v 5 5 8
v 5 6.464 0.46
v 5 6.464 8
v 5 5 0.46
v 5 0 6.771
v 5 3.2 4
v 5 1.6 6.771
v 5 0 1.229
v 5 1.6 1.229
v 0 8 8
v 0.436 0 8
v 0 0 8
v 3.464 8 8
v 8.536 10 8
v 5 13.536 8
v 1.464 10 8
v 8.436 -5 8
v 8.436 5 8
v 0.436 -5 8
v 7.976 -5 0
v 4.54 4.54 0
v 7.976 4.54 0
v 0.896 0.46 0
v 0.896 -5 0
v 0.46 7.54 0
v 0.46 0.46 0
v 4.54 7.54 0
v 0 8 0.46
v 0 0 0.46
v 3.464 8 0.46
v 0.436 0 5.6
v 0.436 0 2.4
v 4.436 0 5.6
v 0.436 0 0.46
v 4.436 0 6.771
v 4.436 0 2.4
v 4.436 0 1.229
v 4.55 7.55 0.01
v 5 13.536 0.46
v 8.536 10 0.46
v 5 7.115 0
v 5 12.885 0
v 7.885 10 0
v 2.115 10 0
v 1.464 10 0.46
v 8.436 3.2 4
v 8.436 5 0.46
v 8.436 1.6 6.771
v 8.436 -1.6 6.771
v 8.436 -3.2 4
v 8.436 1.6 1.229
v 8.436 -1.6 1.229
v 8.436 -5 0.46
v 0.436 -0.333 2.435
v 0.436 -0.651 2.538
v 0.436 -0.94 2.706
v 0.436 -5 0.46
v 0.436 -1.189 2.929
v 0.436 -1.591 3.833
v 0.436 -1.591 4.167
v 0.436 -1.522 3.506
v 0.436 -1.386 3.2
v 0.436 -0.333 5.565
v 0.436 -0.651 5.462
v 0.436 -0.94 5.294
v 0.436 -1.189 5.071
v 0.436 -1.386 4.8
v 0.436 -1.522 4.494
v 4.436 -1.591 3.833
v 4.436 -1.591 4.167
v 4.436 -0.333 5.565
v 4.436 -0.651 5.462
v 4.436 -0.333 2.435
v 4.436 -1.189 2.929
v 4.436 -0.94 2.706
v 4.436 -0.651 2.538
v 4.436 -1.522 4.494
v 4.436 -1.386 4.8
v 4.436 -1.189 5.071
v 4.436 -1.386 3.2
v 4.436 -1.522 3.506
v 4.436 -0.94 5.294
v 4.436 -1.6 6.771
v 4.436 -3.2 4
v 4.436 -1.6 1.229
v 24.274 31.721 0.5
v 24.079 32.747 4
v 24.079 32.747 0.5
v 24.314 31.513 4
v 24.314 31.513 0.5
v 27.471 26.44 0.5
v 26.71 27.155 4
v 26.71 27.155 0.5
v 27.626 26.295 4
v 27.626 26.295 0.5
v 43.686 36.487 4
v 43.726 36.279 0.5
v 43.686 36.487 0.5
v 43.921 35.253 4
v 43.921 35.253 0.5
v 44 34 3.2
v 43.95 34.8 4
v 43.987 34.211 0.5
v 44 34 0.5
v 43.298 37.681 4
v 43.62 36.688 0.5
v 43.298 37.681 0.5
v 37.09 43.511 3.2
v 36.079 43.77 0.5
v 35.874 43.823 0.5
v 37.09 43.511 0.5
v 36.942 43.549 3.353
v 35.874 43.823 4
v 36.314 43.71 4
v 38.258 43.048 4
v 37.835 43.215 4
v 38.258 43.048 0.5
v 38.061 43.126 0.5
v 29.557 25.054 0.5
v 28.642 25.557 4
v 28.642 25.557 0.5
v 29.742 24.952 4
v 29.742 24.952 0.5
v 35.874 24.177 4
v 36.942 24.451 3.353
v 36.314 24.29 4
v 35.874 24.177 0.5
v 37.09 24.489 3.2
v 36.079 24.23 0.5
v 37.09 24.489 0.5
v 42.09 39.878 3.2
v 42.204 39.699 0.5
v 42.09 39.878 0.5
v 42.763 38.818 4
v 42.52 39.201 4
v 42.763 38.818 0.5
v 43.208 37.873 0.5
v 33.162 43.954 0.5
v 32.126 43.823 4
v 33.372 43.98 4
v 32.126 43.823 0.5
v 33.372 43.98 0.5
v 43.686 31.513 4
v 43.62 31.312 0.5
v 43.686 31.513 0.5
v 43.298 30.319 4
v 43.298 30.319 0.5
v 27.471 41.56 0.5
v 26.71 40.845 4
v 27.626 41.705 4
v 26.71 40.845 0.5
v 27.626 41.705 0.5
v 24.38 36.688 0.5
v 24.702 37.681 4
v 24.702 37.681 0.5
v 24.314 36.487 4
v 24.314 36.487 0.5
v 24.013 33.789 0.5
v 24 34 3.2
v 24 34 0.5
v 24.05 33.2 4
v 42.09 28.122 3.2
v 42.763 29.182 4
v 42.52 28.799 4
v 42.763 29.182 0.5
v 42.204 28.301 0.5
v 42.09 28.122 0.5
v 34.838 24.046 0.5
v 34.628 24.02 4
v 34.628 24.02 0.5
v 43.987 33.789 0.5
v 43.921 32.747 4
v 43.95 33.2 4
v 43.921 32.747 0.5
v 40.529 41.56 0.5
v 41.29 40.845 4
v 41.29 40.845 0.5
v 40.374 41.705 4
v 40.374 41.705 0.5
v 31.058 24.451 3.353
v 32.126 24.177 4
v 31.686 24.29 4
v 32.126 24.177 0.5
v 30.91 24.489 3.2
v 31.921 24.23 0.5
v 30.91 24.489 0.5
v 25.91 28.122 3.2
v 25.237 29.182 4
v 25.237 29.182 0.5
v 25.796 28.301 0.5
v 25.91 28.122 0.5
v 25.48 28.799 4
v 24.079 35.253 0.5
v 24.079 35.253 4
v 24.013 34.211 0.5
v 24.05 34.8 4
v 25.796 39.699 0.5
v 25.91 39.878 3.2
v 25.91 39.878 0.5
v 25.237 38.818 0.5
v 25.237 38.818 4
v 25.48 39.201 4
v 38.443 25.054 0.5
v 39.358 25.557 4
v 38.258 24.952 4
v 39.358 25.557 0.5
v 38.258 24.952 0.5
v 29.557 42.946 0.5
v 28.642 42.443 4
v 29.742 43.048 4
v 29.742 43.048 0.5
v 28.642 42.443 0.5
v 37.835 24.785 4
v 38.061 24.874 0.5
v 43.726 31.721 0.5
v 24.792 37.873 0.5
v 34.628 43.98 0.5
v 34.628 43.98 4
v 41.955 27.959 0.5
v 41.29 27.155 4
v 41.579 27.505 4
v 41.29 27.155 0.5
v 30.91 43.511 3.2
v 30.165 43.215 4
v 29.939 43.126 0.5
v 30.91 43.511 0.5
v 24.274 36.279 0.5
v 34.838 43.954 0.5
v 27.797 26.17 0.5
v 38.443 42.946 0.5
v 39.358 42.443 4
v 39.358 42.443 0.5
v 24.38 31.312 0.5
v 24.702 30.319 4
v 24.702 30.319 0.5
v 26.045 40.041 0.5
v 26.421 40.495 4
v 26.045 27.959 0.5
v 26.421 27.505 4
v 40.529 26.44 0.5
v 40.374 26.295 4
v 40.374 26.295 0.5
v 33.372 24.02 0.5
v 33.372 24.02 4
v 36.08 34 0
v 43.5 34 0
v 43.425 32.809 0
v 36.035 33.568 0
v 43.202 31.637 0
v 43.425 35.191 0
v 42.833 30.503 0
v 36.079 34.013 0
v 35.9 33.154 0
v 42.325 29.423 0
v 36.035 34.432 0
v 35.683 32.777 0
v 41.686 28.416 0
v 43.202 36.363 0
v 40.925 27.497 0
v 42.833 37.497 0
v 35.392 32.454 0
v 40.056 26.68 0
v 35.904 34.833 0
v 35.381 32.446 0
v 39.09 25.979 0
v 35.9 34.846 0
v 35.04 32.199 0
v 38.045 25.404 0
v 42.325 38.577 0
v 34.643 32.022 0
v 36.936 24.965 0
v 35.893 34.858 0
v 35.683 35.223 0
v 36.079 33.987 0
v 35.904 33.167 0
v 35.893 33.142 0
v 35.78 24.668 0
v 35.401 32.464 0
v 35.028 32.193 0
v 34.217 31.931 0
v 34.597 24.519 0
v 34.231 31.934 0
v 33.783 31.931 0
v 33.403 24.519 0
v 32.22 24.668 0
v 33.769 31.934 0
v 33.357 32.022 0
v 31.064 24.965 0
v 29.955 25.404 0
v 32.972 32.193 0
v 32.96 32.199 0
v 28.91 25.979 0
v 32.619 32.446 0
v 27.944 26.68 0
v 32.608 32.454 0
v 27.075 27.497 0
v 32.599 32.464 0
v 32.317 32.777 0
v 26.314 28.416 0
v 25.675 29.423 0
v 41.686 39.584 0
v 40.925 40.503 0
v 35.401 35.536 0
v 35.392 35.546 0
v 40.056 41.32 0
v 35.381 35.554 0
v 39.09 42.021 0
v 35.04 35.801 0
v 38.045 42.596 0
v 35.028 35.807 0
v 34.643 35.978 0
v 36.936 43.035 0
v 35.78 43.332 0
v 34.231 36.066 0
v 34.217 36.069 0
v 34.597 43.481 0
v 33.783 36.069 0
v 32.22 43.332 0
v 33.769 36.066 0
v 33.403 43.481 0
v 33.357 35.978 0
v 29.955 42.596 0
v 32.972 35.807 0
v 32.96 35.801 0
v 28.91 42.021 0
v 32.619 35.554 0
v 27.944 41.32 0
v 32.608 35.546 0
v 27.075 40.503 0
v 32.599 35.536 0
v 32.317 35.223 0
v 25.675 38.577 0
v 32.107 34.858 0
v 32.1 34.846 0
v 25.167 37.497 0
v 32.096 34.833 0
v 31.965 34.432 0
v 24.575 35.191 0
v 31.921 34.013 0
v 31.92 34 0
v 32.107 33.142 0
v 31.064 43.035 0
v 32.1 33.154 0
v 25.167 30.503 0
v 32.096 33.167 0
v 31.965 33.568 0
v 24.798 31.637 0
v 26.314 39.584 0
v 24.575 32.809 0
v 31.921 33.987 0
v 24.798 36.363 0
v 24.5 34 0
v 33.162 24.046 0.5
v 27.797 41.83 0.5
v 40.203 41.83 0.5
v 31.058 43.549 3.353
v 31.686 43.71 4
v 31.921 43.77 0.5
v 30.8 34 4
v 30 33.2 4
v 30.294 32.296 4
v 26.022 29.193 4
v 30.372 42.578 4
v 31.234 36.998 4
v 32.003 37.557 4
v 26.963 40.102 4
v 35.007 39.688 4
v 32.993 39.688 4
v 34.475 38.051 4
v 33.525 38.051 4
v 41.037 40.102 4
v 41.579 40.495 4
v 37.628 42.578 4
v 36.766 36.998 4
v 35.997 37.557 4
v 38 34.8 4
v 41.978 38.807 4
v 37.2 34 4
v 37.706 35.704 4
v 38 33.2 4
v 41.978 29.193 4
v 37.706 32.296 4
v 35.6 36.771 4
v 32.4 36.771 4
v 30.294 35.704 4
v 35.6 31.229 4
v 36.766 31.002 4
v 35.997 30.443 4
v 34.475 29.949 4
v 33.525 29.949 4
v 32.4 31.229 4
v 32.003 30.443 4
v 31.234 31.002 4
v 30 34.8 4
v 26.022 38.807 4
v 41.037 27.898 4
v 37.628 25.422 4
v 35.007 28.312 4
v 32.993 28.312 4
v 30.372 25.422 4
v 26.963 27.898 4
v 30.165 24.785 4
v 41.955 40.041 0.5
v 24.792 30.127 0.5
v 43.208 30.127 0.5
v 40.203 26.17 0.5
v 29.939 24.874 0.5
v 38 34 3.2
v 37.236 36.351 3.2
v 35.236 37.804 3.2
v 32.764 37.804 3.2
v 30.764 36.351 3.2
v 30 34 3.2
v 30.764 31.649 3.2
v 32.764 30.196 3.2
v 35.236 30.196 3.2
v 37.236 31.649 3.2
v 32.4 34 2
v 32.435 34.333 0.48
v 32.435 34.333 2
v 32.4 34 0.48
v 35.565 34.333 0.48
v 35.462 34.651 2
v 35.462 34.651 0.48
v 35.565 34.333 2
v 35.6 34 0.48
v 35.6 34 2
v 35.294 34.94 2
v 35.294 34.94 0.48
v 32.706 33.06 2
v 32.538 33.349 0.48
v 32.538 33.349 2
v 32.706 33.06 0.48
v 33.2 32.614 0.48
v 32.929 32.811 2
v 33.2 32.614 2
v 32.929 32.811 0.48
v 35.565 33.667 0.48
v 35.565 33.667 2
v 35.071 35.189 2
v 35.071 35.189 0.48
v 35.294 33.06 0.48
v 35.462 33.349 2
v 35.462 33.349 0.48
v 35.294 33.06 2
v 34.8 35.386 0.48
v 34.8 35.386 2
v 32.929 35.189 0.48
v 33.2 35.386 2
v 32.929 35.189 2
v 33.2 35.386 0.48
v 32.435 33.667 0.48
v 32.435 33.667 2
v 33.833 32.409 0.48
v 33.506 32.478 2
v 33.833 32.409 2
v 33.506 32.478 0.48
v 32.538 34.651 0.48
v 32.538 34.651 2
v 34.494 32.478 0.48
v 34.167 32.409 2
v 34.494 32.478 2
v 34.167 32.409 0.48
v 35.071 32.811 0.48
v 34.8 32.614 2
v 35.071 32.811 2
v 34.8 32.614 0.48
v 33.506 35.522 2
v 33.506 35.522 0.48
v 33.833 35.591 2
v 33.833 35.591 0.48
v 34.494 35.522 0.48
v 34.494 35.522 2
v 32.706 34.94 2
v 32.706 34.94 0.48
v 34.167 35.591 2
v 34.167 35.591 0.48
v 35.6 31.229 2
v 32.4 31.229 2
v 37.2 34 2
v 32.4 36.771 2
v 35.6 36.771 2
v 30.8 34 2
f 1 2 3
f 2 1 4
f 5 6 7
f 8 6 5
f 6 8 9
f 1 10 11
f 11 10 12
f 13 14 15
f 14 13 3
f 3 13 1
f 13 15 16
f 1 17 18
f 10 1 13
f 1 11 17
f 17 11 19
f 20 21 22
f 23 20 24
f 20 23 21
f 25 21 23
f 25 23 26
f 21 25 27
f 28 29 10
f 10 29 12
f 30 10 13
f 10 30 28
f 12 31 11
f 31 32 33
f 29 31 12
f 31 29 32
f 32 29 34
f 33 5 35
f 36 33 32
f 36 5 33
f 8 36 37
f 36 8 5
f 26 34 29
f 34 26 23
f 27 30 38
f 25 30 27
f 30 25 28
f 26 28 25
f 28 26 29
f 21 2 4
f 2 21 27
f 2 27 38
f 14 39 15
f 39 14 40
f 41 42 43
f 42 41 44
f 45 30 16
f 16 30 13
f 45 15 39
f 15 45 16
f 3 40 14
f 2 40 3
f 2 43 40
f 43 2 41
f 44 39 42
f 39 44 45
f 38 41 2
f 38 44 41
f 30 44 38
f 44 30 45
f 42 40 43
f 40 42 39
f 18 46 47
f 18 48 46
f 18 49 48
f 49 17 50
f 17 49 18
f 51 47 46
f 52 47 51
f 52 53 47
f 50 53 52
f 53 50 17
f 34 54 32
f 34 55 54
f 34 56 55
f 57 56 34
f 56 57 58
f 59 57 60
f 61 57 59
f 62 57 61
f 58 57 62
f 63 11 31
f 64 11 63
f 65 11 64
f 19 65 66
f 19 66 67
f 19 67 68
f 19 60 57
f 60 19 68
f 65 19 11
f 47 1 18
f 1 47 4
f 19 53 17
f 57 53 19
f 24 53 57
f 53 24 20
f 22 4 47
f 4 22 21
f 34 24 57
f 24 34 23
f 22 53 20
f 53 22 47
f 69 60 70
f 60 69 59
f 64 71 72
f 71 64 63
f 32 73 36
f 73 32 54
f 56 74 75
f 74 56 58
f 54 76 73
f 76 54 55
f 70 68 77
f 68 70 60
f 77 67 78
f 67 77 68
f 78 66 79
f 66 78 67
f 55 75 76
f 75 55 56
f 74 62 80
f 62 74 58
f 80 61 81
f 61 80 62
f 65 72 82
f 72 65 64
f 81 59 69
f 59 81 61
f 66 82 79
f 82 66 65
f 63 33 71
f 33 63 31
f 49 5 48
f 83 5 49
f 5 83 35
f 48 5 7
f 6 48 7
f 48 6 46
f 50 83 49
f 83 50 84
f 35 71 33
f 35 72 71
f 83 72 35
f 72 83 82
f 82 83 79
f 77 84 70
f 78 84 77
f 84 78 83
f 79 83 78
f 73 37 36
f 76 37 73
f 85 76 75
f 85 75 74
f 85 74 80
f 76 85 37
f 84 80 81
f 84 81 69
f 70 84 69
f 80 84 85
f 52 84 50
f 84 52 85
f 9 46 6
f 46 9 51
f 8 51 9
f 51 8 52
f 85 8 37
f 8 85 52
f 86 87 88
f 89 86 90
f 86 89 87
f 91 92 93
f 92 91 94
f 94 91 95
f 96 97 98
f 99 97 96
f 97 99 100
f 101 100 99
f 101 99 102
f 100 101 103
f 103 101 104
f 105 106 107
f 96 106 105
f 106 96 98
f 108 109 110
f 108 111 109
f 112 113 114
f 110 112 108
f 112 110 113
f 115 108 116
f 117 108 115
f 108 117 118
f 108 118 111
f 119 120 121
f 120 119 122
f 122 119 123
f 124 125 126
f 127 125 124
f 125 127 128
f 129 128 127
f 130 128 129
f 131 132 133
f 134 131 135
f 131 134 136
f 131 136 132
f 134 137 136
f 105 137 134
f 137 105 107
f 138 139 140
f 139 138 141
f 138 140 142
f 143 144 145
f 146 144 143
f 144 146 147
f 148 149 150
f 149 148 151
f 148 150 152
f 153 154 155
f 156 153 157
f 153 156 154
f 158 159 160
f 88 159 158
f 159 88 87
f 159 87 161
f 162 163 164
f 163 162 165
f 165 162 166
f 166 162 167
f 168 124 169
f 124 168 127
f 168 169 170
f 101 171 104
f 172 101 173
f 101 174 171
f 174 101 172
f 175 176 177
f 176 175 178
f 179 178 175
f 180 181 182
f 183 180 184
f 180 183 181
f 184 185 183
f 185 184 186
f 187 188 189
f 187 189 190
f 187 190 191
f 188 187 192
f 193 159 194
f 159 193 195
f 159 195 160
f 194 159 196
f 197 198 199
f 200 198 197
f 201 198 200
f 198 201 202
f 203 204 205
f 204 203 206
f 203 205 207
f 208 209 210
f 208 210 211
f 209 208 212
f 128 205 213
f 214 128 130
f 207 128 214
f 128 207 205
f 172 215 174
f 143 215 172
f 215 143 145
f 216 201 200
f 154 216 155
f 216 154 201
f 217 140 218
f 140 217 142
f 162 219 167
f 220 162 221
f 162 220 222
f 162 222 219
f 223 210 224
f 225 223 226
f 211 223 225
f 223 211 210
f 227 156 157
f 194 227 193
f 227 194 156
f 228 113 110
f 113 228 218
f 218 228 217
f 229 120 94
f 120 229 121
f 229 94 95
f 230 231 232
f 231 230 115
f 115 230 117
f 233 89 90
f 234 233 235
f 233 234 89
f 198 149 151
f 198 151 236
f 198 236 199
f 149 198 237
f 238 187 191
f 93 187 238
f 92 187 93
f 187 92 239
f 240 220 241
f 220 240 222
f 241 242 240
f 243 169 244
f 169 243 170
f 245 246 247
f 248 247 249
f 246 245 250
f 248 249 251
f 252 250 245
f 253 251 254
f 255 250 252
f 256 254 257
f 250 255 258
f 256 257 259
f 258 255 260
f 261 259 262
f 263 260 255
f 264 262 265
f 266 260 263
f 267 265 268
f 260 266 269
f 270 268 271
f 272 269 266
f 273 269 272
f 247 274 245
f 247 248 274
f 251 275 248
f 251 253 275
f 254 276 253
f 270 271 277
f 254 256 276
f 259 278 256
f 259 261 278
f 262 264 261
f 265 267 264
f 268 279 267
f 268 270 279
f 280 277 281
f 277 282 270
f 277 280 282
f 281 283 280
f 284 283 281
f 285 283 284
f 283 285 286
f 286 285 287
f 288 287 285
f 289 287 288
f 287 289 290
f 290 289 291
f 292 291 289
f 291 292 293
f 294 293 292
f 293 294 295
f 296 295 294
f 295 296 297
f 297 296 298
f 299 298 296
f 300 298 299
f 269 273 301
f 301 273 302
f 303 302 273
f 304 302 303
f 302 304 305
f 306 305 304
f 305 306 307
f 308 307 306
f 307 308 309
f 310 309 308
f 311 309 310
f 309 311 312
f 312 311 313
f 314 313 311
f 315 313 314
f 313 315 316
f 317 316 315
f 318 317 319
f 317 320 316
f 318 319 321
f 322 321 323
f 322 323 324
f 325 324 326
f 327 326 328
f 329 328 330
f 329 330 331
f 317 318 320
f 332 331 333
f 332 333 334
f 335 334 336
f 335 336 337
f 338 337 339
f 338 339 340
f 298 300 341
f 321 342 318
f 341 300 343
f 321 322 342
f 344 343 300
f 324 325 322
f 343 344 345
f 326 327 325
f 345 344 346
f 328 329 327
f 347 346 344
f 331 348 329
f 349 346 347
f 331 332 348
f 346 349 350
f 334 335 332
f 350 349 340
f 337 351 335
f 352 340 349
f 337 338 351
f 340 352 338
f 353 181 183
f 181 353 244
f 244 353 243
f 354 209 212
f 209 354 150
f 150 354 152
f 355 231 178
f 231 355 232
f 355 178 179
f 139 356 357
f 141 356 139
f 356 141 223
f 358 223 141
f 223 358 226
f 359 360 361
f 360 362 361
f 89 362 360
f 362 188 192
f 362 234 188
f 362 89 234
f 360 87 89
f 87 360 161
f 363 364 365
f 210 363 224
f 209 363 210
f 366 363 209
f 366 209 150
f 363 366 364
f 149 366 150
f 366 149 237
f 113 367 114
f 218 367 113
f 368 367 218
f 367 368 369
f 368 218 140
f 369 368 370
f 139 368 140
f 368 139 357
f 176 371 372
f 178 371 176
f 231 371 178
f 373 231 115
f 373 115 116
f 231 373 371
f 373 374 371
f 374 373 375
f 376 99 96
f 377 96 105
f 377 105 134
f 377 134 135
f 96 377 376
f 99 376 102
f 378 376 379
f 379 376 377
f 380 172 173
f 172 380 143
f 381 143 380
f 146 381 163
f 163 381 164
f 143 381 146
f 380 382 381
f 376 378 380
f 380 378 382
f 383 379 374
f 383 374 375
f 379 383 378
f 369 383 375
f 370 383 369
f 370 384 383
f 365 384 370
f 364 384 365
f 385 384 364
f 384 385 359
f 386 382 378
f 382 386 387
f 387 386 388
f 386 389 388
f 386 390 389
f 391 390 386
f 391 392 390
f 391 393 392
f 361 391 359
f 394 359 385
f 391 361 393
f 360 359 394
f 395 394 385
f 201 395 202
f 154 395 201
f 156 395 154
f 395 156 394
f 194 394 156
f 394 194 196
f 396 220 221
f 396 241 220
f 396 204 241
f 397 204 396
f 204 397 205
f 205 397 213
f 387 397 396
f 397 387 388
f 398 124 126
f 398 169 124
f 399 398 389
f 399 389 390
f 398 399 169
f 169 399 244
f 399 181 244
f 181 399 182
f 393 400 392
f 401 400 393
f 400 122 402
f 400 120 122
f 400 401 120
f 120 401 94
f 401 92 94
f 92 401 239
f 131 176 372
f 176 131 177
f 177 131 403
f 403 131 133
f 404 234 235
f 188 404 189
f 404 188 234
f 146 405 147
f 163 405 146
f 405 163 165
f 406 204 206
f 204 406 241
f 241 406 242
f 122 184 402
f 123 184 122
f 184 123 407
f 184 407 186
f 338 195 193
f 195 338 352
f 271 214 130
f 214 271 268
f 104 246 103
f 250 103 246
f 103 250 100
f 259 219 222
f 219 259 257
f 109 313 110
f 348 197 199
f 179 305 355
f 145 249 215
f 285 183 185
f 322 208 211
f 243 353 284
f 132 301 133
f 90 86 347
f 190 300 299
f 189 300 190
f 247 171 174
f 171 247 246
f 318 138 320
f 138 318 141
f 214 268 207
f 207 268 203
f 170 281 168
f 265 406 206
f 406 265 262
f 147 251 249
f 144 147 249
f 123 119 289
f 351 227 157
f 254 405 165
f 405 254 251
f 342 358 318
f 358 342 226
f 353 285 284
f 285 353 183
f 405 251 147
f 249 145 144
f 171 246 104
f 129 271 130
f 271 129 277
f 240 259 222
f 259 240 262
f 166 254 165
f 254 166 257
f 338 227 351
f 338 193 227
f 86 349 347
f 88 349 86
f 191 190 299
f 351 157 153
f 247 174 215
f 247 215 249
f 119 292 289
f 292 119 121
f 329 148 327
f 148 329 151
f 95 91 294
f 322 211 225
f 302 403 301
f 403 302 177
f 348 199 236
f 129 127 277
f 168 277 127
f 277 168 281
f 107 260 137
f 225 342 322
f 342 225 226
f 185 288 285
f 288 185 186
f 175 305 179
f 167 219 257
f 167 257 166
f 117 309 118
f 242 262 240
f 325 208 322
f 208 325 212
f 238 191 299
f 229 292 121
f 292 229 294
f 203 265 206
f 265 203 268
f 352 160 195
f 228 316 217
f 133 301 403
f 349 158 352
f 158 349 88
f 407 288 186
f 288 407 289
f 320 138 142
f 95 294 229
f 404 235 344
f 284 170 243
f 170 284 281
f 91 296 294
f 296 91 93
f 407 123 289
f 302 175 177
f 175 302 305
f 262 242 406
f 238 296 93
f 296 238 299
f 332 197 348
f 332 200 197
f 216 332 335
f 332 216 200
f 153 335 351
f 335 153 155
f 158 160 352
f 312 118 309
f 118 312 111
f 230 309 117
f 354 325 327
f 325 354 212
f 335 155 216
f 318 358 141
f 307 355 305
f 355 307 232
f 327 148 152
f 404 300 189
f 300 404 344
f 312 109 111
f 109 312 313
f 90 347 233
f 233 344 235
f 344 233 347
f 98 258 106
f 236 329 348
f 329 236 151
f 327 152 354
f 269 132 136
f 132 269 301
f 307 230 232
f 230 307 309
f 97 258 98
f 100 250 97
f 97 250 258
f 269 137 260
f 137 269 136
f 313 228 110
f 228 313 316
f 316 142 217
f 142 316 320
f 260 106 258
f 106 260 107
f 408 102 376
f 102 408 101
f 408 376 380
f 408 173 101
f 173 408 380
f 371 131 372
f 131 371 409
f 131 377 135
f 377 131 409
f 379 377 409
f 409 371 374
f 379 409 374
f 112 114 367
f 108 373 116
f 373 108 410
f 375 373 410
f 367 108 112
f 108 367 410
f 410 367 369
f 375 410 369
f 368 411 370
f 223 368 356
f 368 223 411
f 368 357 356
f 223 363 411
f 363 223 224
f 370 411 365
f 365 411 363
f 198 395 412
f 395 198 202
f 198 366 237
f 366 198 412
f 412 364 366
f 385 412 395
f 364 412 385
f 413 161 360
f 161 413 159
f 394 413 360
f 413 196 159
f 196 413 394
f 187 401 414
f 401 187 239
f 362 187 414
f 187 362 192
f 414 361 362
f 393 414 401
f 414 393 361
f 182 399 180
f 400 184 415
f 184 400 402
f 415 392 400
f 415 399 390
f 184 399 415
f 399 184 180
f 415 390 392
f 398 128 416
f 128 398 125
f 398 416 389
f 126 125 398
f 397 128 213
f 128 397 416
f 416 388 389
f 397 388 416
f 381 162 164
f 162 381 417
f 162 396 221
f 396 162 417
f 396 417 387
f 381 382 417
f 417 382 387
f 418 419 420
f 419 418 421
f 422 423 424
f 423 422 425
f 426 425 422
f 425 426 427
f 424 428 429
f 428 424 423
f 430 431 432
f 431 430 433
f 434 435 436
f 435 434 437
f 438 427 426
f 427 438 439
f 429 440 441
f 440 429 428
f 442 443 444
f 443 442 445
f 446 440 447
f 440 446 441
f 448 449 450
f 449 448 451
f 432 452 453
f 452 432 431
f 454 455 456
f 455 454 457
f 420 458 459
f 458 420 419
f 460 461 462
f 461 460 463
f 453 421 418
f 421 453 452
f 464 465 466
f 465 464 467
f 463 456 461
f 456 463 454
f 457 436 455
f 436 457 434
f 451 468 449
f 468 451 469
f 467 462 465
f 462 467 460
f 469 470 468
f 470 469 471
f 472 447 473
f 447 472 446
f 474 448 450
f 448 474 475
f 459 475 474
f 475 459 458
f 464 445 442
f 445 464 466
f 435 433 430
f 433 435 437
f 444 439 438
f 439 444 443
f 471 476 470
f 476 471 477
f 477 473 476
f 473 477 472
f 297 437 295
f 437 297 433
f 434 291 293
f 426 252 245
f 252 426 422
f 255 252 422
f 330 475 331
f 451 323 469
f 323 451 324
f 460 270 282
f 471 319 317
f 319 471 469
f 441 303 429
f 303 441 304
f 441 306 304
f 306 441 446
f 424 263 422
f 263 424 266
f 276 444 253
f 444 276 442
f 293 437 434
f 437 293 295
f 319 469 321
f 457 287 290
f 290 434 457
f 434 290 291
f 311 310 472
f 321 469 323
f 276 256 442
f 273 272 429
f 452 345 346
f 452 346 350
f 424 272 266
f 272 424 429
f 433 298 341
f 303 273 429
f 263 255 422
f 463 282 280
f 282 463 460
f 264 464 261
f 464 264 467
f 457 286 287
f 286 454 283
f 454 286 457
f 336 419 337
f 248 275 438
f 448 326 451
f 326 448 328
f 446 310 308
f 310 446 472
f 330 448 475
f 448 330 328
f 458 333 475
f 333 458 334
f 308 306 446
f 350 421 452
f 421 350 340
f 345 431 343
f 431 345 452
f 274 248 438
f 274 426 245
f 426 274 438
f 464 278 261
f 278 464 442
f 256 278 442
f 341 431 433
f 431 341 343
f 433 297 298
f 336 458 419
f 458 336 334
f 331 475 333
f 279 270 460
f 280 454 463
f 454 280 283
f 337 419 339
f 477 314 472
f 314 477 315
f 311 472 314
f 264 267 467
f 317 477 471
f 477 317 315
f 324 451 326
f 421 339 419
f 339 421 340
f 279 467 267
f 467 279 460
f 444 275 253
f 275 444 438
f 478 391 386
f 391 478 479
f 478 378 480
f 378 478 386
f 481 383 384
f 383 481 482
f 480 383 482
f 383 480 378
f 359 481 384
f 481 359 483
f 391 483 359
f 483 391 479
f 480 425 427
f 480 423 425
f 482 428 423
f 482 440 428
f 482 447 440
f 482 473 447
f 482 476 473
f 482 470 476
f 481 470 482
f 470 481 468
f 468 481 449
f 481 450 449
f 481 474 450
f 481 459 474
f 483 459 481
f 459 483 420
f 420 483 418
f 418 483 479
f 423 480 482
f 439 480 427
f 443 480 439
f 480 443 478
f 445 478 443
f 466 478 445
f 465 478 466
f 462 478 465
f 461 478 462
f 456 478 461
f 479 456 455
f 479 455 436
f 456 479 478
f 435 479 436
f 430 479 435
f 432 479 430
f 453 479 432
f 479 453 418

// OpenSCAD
// OpenSCAD file for producing the testpiece, gauge and thumbwheel for orthogonal axis compensation for RepRapPro Ormerod, Mendel and Huxley printers //
// Revised with text. You need to use OpenSCAD version 2015.03 for the test to render correctly, and Arial Black installed as a font //

long = 0; // Set length for testpiece here
chamfer=0.5;

// comment out the following lines to get the parts you want. Comment out the translations if you want the part at the origin.

Gauge();

translate ([12,12,0])
TestPiece();

translate ([34,34,0])
ThumbWheel();



module Gauge()
{
    union()
     {
         chamfer_cube(long+5,8,8);
         translate([5, 10, 4]) rotate([0,0,45]) chamfer_cube(5,5,8,ctr=true);
         
         difference ()
         {
             rotate([0,0,5]) chamfer_cube(8,long,8);
             translate ([-sin(5)*(long-5)-1,(long-5),-1]) cube([10,11,10]);
         }
         
         translate ([-sin(5)*(long-5),(long-5),0]) difference ()
         {
             chamfer_cube(8,10,8,x1=false);
             translate([4,5,4]) rotate([0,90,0]) cylinder(r=1.6,h=10,center=true,$fn=30);
             translate([4,5,4]) rotate([90,0,90]) cylinder(r=3.2,h=6,center=false,$fn=6);
         }
     }
}

module ThumbWheel()
{
	difference()
	{
		intersection ()
		{
			cylinder(r=10,h=4,center=false,$fn=50);
			cylinder(r1=10-chamfer,r2=10+4-chamfer,h=4,center=false,$fn=50);
		}
		translate ([0,0,-1]) cylinder(r=1.6,h=6,center=false,$fn=30);
		translate ([0,0,-0.02]) cylinder(r1=1.6+chamfer,r2=1.6,h=chamfer,center=false,$fn=30);
		translate([0,0,2]) cylinder(r=3.2,h=3,center=false,$fn=6);

		for(a = [0 : 36 : 360] )
		{
		rotate([0,0,a]) translate([4,0,3.2]) rotate([45,0,0])
            cube([7,1.5,1.5]);
		}
	}
}


module TestPiece()
{
 union()
 {
	difference ()
     {
         chamfer_cube(long,8,8);
         translate ([long-1,0.75,1]) rotate ([90,0,90]) 
         linear_extrude(height = 1.1) text("X", font="Arial Black", size=6);
     }

	difference ()
     {
         chamfer_cube(8,long,8);
         translate ([0.75,long+0.1,1]) rotate ([90,0,0]) 
         linear_extrude(height = 1.1) text("Y", font="Arial Black", size=6);
     }

	difference ()
     {
         chamfer_cube(10,10,long);
         translate ([1.5,1.5,long-1]) 
         linear_extrude(height = 1.1) text("Z", font="Arial Black", size=7);
     }


 }
}

module chamfer_cube (x,y,z,h=chamfer,ctr=false,x1=true,x2=true,y1=true,y2=true)
{
    dh = sqrt(2*pow(h,2));

	if (ctr==true)
    {
        translate ([-x/2,-y/2,-z/2]) difference ()
        {
            cube([x,y,z]);
            if (x1==true) {translate([x/2,-0.02,-0.02]) rotate ([45,0,0]) cube([x+1,dh,dh],center=true);}
            if (x2==true) {translate([x/2,y+0.02,-0.02]) rotate ([45,0,0]) cube([x+1,dh,dh],center=true);}
            if (y1==true) {translate([-0.02,y/2,-0.02]) rotate ([0,45,0]) cube([dh,y+1,dh],center=true);}
            if (y2==true) {translate([x+0.02,y/2,-0.02]) rotate ([0,45,0]) cube([dh,y+1,dh],center=true);}
        }
    }
    else
    {
        difference ()
        {
            cube([x,y,z]);
            if (x1==true) {translate([x/2,-0.02,-0.02]) rotate ([45,0,0]) cube([x+1,dh,dh],center=true);}
            if (x2==true) {translate([x/2,y+0.02,-0.02]) rotate ([45,0,0]) cube([x+1,dh,dh],center=true);}
            if (y1==true) {translate([-0.02,y/2,-0.02]) rotate ([0,45,0]) cube([dh,y+1,dh],center=true);}
            if (y2==true) {translate([x+0.02,y/2,-0.02]) rotate ([0,45,0]) cube([dh,y+1,dh],center=true);}
        }        
	}
}
